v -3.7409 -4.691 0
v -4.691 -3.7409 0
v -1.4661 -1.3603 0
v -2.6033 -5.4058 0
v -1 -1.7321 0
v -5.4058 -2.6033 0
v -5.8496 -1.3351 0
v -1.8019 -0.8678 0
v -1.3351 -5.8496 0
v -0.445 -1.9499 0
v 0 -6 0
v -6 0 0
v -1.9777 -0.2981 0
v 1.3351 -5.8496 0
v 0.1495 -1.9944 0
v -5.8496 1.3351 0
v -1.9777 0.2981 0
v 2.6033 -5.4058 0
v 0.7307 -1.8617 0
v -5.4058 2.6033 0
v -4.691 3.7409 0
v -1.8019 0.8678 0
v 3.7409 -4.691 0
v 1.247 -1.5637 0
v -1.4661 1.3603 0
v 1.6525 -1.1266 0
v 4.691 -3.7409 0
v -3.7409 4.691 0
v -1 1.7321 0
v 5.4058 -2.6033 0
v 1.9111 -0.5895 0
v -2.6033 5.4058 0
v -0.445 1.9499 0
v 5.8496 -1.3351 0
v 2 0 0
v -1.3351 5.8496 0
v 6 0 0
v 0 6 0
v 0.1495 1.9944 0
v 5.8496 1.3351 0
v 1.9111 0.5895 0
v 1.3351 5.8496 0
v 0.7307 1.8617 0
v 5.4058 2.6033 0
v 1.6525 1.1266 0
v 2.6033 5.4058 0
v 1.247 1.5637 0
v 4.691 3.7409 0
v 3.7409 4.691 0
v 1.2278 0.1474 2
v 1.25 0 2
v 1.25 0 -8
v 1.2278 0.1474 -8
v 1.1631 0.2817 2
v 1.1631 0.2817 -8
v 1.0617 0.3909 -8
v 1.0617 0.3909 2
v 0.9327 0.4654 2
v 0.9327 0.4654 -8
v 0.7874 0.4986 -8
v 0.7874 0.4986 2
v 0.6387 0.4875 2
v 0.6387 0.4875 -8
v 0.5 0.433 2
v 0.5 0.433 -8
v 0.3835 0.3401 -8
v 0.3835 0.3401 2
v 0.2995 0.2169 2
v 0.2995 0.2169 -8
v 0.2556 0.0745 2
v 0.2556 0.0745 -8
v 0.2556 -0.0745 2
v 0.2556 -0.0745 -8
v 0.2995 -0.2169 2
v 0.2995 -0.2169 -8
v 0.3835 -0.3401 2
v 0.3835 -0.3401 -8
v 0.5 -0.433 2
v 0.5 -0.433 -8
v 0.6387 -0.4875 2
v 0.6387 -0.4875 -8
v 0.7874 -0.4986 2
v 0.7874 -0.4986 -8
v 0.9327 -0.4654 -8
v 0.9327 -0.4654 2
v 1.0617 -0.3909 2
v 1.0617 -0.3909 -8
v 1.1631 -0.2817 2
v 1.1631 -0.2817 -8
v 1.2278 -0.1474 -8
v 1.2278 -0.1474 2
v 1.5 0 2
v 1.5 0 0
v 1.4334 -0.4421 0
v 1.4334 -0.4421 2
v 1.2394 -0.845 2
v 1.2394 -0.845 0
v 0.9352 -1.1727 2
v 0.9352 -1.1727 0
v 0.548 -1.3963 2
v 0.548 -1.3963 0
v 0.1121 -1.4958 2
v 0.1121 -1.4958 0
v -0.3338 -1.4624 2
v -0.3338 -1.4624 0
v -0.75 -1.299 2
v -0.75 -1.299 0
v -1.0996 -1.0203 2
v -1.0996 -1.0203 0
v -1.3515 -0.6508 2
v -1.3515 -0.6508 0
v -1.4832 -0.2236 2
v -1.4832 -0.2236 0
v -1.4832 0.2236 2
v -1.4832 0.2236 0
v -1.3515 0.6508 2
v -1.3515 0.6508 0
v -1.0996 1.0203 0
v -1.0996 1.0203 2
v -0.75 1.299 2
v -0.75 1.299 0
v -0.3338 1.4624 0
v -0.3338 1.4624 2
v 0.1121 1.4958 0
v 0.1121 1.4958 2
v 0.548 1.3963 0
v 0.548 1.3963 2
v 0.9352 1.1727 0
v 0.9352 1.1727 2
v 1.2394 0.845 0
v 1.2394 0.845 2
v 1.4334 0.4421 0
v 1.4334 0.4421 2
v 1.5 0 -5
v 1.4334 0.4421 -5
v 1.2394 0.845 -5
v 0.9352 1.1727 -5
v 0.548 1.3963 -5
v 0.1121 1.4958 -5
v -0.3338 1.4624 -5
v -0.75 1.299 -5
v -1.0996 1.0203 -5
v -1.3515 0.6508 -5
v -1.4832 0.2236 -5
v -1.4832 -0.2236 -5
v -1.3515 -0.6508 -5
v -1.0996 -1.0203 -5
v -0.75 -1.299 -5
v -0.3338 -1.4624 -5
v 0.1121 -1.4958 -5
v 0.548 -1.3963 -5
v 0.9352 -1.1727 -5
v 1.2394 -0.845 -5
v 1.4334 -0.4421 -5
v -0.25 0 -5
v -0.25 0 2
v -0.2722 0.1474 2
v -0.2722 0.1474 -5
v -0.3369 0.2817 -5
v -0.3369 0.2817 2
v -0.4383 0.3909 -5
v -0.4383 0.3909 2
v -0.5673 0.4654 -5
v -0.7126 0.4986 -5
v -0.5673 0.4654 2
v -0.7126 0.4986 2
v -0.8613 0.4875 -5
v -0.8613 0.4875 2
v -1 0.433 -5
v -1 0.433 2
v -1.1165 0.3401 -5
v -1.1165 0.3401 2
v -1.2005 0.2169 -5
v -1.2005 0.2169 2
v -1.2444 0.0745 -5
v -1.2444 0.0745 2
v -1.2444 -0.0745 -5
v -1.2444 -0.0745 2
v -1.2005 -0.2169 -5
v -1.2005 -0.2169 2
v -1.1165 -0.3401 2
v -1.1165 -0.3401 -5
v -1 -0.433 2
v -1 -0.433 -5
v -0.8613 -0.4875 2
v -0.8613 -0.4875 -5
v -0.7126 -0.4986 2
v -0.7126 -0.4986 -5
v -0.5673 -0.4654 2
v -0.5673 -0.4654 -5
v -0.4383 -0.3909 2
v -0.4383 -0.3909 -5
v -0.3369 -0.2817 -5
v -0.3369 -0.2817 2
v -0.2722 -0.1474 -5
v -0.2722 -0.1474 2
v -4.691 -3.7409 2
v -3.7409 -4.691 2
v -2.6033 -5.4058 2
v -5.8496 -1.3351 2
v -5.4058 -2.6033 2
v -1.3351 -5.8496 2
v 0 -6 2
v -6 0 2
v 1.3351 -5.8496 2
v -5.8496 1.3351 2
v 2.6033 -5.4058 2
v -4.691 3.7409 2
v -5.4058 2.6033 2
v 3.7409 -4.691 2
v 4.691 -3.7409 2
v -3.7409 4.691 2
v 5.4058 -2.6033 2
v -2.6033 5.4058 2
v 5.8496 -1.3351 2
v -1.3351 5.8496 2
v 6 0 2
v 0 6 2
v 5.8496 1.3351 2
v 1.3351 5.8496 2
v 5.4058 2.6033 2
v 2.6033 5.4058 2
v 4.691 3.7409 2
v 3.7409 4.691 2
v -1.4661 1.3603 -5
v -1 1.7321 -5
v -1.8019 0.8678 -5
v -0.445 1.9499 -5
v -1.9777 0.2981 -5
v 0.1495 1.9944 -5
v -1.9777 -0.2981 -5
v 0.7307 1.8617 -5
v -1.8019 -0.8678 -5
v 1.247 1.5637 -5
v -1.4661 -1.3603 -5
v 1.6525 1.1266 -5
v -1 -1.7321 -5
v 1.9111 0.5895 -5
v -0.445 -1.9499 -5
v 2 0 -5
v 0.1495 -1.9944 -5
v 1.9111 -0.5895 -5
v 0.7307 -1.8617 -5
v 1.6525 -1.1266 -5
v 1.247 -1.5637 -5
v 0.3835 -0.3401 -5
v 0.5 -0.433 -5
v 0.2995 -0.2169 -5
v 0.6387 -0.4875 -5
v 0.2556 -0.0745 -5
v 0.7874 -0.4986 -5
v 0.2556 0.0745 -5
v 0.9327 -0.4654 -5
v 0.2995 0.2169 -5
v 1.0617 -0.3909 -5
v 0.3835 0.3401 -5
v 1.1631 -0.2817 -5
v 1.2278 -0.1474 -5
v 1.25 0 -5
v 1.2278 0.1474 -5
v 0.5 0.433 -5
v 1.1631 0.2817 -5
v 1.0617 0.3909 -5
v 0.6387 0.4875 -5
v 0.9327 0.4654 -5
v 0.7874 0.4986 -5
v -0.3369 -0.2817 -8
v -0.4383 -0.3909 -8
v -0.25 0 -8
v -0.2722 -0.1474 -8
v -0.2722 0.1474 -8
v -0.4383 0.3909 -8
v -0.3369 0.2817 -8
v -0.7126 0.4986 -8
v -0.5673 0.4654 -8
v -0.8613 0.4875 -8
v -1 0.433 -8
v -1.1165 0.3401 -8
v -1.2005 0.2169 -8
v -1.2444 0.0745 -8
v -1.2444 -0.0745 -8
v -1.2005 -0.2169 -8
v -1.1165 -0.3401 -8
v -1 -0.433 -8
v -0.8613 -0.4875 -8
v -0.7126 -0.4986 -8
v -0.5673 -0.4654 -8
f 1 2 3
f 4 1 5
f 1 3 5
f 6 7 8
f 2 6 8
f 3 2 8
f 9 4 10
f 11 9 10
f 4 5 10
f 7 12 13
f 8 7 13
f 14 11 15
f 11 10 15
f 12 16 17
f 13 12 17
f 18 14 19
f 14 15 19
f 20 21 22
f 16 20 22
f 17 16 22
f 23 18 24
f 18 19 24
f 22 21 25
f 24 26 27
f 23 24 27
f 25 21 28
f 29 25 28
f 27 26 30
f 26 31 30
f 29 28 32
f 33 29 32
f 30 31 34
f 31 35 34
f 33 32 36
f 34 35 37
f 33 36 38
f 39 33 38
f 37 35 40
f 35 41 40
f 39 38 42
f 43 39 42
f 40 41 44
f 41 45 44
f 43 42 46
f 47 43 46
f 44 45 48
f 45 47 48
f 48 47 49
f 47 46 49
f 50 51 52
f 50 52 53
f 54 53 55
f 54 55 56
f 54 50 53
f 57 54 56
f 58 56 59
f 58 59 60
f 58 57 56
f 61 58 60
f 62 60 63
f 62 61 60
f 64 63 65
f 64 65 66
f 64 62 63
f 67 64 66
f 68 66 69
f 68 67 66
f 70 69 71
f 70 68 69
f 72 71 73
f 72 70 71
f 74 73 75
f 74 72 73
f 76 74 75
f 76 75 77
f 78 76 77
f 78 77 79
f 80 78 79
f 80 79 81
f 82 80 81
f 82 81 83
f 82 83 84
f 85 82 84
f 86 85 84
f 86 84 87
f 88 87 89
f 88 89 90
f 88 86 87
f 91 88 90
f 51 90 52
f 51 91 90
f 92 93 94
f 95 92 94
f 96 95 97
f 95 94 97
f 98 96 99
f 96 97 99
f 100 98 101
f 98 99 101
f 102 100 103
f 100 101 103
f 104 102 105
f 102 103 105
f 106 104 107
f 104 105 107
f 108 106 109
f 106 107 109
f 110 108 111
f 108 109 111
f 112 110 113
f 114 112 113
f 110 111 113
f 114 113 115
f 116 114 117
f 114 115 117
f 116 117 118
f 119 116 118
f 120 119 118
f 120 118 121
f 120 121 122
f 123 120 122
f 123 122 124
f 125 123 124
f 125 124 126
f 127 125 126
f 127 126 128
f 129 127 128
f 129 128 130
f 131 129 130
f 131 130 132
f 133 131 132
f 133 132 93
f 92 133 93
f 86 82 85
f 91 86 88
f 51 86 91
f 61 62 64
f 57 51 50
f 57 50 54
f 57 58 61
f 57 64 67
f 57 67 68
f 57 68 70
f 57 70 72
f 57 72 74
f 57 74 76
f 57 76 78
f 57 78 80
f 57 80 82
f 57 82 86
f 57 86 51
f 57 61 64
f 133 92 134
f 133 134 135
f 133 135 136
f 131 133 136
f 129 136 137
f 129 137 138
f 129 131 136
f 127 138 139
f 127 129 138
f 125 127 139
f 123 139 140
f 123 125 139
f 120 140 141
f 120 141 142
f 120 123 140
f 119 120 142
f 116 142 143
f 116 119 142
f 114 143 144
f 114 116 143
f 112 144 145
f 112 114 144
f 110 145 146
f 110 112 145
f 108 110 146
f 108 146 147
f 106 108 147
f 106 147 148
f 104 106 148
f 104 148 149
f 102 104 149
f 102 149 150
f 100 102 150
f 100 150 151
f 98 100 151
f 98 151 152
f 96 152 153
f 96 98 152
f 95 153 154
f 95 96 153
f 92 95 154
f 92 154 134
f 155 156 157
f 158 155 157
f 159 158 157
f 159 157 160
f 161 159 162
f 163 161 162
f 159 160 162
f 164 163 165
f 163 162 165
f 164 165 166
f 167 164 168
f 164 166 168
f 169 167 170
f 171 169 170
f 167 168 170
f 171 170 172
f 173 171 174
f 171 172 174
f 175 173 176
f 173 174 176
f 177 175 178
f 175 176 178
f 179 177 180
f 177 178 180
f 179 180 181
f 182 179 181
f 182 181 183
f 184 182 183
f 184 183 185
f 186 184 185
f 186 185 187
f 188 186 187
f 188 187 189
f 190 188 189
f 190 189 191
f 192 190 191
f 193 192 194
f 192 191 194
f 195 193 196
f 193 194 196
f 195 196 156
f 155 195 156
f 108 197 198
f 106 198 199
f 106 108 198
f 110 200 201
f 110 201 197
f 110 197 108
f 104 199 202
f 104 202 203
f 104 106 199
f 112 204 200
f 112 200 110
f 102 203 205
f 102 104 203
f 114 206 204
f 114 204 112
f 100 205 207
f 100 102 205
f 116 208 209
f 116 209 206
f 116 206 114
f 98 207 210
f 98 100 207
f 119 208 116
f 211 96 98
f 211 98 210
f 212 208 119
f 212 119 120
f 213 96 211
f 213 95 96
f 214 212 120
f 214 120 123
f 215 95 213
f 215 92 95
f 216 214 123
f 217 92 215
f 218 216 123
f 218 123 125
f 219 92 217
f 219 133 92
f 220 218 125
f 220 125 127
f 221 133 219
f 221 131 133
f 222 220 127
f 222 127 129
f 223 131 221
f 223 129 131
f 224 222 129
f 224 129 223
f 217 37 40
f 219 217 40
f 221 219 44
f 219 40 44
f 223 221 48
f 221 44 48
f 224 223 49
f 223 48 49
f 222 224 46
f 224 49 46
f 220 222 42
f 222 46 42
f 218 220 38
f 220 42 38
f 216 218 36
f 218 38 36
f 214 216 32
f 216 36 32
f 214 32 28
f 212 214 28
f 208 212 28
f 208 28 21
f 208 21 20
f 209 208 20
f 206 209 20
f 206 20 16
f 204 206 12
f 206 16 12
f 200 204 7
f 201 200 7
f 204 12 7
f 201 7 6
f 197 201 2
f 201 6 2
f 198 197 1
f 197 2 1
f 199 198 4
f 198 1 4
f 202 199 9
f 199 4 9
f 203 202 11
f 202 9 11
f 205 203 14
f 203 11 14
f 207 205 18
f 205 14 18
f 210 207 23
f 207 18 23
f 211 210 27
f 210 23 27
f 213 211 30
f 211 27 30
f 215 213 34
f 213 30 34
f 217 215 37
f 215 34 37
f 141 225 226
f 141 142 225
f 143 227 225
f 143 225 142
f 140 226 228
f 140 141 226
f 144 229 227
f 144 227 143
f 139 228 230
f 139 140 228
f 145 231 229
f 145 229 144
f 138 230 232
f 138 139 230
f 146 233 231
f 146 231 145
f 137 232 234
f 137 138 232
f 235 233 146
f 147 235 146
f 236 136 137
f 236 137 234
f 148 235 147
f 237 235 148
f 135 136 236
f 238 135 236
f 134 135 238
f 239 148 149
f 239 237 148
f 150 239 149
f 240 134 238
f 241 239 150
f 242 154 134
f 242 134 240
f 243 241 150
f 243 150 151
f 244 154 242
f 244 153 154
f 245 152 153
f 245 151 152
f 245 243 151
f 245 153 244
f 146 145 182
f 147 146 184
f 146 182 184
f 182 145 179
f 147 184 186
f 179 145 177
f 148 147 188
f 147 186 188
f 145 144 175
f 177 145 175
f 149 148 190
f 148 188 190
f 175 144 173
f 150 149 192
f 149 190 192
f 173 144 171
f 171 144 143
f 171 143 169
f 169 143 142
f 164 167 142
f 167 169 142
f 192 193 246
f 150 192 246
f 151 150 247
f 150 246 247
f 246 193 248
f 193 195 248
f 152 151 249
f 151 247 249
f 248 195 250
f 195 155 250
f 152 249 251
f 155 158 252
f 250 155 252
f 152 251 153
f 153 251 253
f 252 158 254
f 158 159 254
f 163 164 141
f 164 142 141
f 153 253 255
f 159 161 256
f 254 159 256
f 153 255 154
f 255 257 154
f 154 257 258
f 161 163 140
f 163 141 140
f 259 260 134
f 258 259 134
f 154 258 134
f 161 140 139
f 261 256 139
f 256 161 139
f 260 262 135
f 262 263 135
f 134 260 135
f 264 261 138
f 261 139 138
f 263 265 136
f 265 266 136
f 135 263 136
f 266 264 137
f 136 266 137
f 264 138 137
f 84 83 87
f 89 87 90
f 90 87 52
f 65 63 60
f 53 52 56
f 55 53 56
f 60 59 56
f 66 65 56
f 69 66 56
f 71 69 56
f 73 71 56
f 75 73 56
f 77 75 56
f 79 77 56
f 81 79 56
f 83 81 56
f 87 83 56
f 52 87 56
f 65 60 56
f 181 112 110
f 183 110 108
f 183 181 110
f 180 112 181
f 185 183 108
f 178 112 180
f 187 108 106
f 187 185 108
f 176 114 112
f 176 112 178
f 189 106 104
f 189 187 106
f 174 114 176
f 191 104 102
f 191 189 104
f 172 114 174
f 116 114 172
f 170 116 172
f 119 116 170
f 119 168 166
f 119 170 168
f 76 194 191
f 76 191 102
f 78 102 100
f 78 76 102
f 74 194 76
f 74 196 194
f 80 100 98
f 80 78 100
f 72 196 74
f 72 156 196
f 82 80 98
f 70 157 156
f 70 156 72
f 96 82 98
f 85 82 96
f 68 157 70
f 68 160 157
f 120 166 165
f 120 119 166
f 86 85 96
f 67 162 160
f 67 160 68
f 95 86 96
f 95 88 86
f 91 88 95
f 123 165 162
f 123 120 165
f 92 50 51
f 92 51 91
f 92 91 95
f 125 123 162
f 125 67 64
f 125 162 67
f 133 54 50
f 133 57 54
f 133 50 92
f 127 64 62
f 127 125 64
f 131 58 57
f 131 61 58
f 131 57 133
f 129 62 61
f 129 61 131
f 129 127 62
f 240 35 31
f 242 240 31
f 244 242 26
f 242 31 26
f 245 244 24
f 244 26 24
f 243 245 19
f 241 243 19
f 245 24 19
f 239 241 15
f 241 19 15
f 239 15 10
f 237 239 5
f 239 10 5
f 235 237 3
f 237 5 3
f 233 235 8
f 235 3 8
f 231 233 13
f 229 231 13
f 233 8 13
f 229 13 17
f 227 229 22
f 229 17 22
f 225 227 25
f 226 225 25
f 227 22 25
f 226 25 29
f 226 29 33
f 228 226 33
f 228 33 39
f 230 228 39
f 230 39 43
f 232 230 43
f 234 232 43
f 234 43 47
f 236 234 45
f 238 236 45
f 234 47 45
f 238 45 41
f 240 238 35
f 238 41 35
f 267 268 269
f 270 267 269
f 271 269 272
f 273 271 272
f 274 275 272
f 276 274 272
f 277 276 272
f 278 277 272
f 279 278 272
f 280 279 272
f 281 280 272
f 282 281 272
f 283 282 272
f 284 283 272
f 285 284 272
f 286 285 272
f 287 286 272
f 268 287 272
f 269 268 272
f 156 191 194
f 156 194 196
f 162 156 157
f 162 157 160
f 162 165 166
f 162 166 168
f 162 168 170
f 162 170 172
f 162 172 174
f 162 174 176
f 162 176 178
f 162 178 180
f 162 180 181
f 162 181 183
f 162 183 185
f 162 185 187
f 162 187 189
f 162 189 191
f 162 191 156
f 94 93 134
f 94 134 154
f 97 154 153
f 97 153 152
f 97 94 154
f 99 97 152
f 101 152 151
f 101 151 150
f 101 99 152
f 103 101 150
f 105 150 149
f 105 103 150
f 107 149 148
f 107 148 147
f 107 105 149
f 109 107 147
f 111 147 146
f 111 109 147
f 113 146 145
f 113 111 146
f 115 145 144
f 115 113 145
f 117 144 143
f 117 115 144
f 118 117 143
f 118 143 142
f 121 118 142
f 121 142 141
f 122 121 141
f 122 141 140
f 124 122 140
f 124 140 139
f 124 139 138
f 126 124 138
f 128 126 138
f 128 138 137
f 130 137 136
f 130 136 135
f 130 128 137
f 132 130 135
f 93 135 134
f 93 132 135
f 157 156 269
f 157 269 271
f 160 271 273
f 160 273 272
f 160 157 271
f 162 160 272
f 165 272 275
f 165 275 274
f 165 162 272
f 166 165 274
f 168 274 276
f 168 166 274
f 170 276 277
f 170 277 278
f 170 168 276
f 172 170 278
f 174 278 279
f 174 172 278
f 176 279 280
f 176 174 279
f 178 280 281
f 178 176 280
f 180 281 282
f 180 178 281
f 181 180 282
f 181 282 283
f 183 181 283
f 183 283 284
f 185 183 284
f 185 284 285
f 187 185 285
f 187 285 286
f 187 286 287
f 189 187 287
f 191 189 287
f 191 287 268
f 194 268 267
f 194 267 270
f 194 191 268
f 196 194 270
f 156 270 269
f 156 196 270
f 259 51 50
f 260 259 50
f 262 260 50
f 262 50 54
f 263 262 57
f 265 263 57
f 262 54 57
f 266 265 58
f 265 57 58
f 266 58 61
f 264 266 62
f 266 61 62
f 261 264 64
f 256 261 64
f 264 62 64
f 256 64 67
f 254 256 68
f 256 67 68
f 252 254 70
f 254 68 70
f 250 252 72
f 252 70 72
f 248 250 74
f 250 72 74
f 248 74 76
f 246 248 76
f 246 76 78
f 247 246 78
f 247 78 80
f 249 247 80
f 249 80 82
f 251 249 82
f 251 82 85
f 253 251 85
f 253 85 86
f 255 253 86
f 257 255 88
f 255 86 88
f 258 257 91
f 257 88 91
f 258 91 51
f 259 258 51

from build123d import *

# Parameters (mm, degrees)
F0_R     = 6
F1_DEPTH = 2
F2_R     = 2
F2_R_2   = 1.5
F3_DEPTH = 5
F4_R     = 1.5
F5_DEPTH = 25
F6_R     = 1.5
F6_R_2   = 0.5
F7_DEPTH = 7
F8_R     = 0.5
F9_DEPTH = 10


with BuildPart() as f1:
    # F0 (on Top) → F1 (new body)
    with BuildSketch(Plane.XY):
        Circle(F0_R)
    extrude(amount=F1_DEPTH)

    # F2 (on face) → F3 (join)
    with BuildSketch(Plane(origin=(0, 0, 0), x_dir=(1, 0, 0), z_dir=(0, 0, -1))):
        Circle(F2_R)
        Circle(F2_R_2, mode=Mode.SUBTRACT)
    extrude(amount=F3_DEPTH)

    # F4 (on face) → F5 (cut)
    with BuildSketch(Plane(origin=(0, 0, 0), x_dir=(1, 0, 0), z_dir=(0, 0, -1))):
        Circle(F4_R)
    extrude(amount=-F5_DEPTH, mode=Mode.SUBTRACT)


with BuildPart() as f7:
    # F6 (on face) → F7 (new body)
    with BuildSketch(Plane.XY.offset(2)):
        Circle(F6_R)
        with Locations((-0.75, 0)):
            Circle(F6_R_2, mode=Mode.SUBTRACT)
        with Locations((0.75, 0)):
            Circle(F6_R_2, mode=Mode.SUBTRACT)
    extrude(amount=-F7_DEPTH)


with BuildPart() as f9:
    # F8 (on face) → F9 (new body)
    with BuildSketch(Plane.XY.offset(2)):
        with Locations((-0.75, 0)):
            Circle(F8_R)
        with Locations((0.75, 0)):
            Circle(F8_R)
    extrude(amount=-F9_DEPTH)


solid = Compound([f1.part, f7.part, f9.part])
